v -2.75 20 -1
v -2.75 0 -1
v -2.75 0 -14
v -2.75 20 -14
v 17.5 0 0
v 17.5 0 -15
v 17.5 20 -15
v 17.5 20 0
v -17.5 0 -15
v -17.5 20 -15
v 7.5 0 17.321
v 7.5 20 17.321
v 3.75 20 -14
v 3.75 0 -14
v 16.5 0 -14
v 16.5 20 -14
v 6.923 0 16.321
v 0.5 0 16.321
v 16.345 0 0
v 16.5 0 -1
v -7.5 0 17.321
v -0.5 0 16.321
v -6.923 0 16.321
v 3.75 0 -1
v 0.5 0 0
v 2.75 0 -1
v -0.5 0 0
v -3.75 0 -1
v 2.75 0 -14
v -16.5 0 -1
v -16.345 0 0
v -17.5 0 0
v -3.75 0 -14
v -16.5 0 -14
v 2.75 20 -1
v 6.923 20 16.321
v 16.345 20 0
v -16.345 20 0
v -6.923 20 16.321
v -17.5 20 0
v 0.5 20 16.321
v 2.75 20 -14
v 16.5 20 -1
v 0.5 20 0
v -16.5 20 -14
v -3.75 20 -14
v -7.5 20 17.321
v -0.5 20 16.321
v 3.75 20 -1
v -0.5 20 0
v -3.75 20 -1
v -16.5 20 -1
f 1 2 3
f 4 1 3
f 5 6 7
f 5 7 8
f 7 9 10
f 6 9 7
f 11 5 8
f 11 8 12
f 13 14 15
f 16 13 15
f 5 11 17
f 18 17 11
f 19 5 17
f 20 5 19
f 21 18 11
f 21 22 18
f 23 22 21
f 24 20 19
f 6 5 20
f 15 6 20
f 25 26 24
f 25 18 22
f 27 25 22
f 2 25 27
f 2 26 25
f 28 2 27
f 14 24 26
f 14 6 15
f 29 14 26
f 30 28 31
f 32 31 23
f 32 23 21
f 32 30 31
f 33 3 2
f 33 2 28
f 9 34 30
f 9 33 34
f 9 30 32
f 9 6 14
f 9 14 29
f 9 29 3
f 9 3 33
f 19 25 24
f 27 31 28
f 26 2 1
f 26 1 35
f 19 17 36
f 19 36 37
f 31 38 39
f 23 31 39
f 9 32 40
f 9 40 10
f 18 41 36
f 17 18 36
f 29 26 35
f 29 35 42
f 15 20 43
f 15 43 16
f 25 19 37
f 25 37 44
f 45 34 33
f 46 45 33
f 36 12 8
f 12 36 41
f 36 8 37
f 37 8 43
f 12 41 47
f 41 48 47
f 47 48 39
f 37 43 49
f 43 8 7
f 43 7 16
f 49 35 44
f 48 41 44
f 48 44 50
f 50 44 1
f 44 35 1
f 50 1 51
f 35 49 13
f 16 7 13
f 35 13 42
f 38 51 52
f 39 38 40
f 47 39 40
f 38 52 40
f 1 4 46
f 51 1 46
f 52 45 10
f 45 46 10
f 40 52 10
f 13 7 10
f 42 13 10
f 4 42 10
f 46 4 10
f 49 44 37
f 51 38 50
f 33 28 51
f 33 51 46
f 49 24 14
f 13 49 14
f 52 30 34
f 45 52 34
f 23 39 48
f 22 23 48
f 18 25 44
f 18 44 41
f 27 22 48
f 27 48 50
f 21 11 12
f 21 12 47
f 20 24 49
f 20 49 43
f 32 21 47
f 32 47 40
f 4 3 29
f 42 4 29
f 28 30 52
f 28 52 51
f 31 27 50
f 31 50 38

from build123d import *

# Parameters (mm, degrees)
SFIVEBASETP1_W     = 12.75
SFIVEBASETP1_H     = 13
SFIVEBASETP1_W_2   = 5.5
FFIVEBASETP1_DEPTH = 20


with BuildPart() as part:
    # SFiveBaseTP1 → FFiveBaseTP1 (new body)
    with BuildSketch(Plane(origin=(0, 0, 0), x_dir=(1, 0, 0), z_dir=(0, 1, 0))):
        Polygon((-17.5, 15), (17.5, 15), (17.5, 0), (7.5, -17.320508076), (-7.5, -17.320508076), (-17.5, 0), align=None)
        Polygon((-16.345299462, 0), (-6.922649731, -16.320508076), (-0.5, -16.320508076), (-0.5, 0), align=None, mode=Mode.SUBTRACT)
        with Locations((-10.125, 7.5)):
            Rectangle(SFIVEBASETP1_W, SFIVEBASETP1_H, mode=Mode.SUBTRACT)
        with Locations((10.125, 7.5)):
            Rectangle(SFIVEBASETP1_W, SFIVEBASETP1_H, mode=Mode.SUBTRACT)
        Polygon((0.5, 0), (0.5, -16.320508076), (6.922649731, -16.320508076), (16.345299462, 0), align=None, mode=Mode.SUBTRACT)
        with Locations((0, 7.5)):
            Rectangle(SFIVEBASETP1_W_2, SFIVEBASETP1_H, mode=Mode.SUBTRACT)
    extrude(amount=FFIVEBASETP1_DEPTH)


solid = part.part
